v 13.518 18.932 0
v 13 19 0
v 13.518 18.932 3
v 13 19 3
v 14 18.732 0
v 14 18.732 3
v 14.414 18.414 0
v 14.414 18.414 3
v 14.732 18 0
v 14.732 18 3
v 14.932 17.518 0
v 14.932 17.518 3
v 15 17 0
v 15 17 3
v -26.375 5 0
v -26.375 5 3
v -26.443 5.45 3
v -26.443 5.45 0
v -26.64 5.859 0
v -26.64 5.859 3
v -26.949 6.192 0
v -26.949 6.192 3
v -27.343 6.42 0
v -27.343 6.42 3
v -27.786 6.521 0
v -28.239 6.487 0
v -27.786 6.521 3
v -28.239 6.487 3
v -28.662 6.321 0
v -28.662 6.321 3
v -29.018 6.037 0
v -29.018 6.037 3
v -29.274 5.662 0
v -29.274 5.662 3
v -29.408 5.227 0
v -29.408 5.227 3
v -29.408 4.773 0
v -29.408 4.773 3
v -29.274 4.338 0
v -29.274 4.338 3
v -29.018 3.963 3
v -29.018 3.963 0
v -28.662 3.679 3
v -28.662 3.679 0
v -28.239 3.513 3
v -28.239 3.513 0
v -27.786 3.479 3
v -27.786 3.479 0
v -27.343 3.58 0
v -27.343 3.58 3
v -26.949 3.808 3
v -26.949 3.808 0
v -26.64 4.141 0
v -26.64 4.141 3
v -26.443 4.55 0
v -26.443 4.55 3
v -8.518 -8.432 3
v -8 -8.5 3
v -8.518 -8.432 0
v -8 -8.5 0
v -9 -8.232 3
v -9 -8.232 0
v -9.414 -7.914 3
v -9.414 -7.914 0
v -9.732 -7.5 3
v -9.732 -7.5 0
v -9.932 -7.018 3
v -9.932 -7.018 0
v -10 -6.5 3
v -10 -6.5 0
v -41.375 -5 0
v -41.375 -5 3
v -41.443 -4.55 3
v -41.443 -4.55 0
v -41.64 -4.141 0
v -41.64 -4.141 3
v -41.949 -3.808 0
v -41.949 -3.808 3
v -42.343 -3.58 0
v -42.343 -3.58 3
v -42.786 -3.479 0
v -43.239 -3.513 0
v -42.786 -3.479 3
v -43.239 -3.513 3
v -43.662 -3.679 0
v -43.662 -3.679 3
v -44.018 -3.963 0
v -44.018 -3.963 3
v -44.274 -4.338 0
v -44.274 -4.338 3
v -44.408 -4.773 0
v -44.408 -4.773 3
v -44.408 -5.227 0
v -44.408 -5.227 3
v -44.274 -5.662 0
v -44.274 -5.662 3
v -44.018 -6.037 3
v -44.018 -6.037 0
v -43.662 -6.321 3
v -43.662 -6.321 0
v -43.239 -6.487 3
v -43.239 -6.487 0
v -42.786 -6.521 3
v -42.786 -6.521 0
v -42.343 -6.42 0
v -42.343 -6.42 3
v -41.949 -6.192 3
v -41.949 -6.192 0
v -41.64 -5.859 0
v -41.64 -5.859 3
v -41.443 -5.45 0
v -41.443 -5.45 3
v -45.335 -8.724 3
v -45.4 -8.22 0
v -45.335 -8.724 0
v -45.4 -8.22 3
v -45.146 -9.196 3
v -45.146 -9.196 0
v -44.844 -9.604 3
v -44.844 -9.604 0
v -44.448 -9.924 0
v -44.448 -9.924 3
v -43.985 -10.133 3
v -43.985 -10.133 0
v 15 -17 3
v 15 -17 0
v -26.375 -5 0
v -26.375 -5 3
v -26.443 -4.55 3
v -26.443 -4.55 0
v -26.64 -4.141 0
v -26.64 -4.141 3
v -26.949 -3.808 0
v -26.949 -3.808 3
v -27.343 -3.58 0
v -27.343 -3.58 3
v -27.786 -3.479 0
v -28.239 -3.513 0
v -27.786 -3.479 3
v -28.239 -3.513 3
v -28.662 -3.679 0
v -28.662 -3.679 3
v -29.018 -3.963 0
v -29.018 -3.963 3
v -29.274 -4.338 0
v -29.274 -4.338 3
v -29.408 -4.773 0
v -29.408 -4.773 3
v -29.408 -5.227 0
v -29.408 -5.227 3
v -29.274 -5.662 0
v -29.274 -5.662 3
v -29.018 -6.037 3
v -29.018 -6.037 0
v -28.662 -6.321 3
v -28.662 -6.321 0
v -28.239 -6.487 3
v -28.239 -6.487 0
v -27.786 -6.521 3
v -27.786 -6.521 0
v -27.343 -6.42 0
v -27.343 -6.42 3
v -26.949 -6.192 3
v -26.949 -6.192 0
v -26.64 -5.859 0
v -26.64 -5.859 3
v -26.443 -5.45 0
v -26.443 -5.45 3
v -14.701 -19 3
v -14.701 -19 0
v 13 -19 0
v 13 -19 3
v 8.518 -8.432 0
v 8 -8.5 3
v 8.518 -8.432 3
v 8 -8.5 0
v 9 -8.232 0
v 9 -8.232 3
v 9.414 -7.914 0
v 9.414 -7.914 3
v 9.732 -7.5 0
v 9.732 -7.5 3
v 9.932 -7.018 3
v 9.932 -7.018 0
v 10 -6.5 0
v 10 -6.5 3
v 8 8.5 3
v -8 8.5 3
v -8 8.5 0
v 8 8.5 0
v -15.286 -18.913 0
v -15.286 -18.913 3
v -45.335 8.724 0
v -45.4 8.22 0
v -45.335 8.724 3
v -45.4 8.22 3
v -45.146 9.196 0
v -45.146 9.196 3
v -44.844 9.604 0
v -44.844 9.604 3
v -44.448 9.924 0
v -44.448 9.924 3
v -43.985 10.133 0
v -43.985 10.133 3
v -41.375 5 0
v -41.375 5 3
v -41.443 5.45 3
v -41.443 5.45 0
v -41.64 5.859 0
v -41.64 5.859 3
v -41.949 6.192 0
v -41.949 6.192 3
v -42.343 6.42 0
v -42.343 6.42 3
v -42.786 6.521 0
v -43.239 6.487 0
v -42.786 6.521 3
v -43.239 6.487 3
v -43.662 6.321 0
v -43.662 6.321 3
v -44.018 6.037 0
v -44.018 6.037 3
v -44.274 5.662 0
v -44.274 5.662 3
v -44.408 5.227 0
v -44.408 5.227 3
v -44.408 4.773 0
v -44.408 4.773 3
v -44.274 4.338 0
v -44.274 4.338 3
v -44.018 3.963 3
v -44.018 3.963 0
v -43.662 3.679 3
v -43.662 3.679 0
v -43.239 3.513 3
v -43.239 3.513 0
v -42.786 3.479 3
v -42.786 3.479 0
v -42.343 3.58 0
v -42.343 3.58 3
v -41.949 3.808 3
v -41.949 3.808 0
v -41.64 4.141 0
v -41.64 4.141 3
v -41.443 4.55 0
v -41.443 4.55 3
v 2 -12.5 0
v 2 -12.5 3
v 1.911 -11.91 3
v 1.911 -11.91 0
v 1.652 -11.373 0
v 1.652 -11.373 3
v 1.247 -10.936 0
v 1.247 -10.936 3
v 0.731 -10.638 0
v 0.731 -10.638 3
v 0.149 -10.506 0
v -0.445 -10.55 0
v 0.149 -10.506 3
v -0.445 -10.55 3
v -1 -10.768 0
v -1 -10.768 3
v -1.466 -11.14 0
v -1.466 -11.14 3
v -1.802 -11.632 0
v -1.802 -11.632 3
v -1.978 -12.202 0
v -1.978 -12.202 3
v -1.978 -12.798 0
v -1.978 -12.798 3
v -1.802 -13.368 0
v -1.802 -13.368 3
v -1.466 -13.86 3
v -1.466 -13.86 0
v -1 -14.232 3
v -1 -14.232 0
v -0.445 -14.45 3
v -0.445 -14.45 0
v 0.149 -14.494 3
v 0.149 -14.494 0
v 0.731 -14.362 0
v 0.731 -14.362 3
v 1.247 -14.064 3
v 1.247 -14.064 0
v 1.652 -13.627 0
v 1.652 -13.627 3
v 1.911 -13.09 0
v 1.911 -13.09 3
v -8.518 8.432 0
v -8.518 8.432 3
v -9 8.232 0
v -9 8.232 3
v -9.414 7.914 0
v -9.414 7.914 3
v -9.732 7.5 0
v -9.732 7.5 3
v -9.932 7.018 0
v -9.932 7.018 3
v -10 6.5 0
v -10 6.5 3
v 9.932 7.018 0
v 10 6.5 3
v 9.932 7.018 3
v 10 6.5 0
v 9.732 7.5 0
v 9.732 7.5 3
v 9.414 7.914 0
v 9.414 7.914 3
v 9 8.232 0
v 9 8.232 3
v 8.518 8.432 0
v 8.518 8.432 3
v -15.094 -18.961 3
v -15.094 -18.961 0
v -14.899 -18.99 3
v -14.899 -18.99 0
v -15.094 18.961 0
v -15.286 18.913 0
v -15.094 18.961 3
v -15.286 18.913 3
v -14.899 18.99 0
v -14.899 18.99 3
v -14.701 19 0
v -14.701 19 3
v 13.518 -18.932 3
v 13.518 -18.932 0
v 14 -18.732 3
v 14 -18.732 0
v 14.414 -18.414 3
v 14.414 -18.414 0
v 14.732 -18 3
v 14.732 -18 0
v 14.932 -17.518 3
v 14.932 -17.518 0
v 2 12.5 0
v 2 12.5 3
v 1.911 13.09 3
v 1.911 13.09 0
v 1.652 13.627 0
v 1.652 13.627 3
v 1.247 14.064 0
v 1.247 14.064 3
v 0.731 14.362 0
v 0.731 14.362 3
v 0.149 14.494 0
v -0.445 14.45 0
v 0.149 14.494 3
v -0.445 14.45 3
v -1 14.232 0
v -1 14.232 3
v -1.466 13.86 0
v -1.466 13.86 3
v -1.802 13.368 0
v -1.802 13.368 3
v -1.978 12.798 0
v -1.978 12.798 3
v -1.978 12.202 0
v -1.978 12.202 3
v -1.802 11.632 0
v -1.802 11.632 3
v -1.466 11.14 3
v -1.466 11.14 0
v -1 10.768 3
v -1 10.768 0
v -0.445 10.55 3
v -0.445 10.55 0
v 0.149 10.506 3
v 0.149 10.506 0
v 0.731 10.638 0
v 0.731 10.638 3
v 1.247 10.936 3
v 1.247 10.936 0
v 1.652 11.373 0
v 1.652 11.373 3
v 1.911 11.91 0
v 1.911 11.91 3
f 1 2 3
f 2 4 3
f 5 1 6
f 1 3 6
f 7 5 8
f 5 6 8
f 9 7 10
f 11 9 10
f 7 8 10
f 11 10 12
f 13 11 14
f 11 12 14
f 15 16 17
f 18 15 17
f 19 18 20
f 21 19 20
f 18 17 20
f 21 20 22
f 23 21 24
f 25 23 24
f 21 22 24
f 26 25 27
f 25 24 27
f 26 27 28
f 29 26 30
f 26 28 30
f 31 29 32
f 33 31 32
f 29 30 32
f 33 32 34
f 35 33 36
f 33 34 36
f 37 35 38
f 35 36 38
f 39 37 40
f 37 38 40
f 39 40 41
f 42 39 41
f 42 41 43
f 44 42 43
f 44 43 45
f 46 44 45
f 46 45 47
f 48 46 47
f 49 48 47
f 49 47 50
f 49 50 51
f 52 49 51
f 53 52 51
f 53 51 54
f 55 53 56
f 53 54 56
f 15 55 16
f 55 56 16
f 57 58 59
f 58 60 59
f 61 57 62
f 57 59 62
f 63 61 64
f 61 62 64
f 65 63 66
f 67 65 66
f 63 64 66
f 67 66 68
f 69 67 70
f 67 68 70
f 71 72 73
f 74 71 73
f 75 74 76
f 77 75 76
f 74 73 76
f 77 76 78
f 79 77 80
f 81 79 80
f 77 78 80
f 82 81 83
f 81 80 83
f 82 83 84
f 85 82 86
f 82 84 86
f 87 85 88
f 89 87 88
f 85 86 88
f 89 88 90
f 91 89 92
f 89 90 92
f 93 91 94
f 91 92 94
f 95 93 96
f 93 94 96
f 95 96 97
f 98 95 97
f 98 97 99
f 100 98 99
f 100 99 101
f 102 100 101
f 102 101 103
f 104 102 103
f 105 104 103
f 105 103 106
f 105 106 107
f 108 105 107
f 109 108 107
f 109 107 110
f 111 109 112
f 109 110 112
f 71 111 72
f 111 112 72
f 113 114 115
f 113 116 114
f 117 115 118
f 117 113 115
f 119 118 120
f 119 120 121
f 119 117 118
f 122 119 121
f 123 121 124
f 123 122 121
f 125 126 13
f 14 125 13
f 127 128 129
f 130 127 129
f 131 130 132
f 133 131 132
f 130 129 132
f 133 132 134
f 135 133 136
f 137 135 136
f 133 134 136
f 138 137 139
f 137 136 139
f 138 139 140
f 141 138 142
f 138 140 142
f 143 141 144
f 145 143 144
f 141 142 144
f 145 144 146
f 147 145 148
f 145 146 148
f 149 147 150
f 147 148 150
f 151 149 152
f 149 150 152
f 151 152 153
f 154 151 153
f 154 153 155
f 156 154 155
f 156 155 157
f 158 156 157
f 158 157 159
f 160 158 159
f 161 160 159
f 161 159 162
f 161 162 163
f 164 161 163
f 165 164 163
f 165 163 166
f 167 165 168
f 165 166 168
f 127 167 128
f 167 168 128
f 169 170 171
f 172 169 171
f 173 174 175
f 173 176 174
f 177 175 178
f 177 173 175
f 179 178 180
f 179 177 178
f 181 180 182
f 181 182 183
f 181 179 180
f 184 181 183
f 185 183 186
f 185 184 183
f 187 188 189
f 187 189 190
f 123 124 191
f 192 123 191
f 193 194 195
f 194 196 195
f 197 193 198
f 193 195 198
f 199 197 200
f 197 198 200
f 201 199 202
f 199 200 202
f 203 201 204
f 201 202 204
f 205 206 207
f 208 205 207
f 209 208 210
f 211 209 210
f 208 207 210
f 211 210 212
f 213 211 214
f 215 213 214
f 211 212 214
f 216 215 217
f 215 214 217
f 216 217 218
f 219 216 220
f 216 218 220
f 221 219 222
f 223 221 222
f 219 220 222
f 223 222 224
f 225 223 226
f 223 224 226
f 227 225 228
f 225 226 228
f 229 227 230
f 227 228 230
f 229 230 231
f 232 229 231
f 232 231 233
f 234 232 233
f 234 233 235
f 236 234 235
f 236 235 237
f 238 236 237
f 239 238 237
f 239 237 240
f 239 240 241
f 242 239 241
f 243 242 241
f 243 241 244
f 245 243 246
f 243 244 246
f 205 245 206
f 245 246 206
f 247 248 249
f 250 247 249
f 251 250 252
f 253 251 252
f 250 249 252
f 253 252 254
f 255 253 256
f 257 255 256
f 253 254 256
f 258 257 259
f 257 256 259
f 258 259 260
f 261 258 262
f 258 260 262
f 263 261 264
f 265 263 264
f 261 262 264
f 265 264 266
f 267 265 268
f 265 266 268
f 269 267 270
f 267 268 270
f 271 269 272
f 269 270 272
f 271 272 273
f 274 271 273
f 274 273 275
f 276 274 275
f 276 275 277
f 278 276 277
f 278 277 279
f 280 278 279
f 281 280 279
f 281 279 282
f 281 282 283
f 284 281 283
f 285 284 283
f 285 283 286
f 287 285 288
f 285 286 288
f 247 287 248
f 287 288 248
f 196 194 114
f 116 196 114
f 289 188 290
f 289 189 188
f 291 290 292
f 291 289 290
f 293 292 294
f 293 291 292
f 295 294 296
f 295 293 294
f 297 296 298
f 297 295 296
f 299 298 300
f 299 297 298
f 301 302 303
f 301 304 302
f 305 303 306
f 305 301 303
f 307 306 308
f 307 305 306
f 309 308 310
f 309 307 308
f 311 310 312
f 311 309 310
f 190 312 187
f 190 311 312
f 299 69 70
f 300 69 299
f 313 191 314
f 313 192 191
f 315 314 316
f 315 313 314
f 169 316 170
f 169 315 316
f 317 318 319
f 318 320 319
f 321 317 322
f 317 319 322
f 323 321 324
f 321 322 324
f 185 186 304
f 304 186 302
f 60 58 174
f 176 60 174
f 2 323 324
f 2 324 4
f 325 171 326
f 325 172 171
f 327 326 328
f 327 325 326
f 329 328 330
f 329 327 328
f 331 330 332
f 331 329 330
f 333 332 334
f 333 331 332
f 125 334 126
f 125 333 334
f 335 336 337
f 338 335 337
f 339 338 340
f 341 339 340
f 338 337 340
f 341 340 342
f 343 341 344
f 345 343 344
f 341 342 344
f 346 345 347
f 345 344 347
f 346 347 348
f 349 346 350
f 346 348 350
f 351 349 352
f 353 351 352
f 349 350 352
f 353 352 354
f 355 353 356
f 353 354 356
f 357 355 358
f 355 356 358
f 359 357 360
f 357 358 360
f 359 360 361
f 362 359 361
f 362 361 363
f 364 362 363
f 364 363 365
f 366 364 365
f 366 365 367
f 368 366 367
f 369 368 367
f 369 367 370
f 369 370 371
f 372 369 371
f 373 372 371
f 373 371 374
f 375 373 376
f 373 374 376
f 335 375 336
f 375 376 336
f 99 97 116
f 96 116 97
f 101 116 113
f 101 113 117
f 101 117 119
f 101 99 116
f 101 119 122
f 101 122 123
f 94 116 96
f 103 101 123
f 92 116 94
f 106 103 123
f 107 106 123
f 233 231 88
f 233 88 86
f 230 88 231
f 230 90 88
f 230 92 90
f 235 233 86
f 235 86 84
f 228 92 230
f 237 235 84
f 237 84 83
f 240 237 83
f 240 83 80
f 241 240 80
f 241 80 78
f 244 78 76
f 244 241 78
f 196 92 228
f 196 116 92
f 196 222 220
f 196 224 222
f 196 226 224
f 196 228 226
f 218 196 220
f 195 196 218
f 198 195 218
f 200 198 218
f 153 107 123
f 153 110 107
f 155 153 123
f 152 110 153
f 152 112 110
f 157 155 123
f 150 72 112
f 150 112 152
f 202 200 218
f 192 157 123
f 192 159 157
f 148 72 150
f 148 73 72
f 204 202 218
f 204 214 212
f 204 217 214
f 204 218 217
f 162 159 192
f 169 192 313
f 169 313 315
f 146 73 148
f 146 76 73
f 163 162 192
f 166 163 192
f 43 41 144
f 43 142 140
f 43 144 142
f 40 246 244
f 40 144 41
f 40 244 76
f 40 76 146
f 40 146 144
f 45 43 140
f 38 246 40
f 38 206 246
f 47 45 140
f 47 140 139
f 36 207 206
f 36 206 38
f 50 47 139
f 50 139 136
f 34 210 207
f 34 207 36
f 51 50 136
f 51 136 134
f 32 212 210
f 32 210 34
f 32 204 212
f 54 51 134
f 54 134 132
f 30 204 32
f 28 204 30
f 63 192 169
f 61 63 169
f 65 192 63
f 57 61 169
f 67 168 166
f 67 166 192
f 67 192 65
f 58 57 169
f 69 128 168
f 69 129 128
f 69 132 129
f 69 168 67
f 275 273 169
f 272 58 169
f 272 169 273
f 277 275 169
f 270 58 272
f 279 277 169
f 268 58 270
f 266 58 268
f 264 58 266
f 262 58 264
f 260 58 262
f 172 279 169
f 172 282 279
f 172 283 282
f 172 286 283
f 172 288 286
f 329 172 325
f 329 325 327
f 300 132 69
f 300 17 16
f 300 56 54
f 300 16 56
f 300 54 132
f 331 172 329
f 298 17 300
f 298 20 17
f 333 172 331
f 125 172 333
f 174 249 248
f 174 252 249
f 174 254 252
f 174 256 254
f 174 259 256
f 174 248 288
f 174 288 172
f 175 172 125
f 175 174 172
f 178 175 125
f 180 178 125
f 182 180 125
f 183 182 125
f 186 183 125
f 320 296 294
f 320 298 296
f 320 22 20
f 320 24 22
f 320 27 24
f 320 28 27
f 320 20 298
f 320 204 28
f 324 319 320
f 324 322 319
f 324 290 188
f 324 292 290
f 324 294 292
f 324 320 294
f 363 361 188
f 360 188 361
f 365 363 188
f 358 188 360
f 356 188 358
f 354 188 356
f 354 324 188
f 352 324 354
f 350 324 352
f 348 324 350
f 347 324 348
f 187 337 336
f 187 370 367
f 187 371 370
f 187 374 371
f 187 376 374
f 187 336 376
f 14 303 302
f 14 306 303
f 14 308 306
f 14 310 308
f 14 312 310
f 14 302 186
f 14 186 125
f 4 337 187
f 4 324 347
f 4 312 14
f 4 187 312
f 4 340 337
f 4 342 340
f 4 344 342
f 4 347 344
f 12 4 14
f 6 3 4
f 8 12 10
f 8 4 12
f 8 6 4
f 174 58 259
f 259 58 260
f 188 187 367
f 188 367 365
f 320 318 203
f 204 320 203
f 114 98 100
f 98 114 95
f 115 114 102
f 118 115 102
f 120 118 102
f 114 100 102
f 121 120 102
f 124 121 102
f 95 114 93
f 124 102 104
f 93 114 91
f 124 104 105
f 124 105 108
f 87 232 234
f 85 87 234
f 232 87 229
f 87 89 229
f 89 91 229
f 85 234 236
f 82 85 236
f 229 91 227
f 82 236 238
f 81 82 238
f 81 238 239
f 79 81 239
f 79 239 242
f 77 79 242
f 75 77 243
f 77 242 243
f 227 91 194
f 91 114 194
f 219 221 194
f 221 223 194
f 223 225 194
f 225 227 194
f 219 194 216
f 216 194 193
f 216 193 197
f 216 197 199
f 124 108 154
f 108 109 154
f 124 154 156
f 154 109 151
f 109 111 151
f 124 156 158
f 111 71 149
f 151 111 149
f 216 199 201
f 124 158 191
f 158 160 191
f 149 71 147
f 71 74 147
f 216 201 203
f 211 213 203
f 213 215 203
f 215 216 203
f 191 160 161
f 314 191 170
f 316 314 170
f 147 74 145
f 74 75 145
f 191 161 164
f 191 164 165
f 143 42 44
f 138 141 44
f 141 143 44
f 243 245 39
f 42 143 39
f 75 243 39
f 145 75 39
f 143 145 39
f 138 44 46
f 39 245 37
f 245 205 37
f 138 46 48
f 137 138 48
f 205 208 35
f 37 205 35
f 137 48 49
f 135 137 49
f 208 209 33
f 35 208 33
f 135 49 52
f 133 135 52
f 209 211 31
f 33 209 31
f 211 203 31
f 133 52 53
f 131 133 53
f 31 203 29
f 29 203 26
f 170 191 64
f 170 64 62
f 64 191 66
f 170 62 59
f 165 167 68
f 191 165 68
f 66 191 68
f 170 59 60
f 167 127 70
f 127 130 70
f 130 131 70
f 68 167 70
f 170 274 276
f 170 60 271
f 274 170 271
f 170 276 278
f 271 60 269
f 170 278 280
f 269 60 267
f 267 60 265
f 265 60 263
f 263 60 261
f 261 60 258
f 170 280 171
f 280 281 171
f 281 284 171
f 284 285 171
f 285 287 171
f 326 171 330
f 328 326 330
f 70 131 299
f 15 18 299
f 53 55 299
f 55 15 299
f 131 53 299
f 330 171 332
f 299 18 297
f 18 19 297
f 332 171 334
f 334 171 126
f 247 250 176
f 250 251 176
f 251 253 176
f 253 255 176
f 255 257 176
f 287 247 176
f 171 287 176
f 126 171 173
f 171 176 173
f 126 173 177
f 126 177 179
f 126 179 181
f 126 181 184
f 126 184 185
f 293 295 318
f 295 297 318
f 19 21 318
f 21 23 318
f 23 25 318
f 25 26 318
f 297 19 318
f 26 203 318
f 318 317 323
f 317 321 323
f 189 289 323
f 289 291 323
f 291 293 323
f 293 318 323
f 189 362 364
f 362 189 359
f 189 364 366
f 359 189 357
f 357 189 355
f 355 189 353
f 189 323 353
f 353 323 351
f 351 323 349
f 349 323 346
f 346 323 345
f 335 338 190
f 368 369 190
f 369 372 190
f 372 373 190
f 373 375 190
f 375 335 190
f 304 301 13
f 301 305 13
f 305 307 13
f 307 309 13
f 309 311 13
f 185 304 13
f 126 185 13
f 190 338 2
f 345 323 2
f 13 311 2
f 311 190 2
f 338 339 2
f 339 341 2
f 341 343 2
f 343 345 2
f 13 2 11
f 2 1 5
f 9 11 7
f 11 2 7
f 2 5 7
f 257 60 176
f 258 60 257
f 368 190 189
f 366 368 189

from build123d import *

# Parameters (mm, degrees)
SKETCH_1_W          = 30
SKETCH_1_H          = 38
EXTRUDE_1_DEPTH     = 3
SKETCH_2_R          = 2
CUT_EXTRUDE_1_DEPTH = 3
SKETCH_3_R          = 1.525
CUT_EXTRUDE_2_DEPTH = 3
FILLET_1_R          = 2
SKETCH_4_W          = 20
SKETCH_4_H          = 17
CUT_EXTRUDE_3_DEPTH = 3
FILLET_2_R          = 2


with BuildPart() as part:
    # 草图1 → 凸台-拉伸1 (new body)
    with BuildSketch(Plane.XY):
        Polygon((-45.4, 9.7), (-45.4, -9.7), (-15, -19), (-15, 19), align=None)
        Rectangle(SKETCH_1_W, SKETCH_1_H)
    extrude(amount=EXTRUDE_1_DEPTH)

    # 草图2 → 切除-拉伸1 (cut)
    with BuildSketch(Plane.XY.offset(3)):
        with Locations((0, 12.5)):
            Circle(SKETCH_2_R)
        with Locations((0, -12.5)):
            Circle(SKETCH_2_R)
    extrude(amount=-CUT_EXTRUDE_1_DEPTH, mode=Mode.SUBTRACT)

    # 草图3 → 切除-拉伸2 (cut)
    with BuildSketch(Plane.XY.offset(3)):
        with Locations((-42.9, 5)):
            Circle(SKETCH_3_R)
        with Locations((-27.9, 5)):
            Circle(SKETCH_3_R)
        with Locations((-42.9, -5)):
            Circle(SKETCH_3_R)
        with Locations((-27.9, -5)):
            Circle(SKETCH_3_R)
    extrude(amount=-CUT_EXTRUDE_2_DEPTH, mode=Mode.SUBTRACT)

    # 圆角1
    fillet_1_edges = [part.edges().sort_by_distance(p)[0] for p in [
        (-45.4, 9.7, 1.5),
        (-15, 19, 1.5),
        (15, 19, 1.5),
        (15, -19, 1.5),
        (-15, -19, 1.5),
        (-45.4, -9.7, 1.5),
    ]]
    fillet(fillet_1_edges, radius=FILLET_1_R)

    # 草图4 → 切除-拉伸3 (cut)
    with BuildSketch(Plane.XY.offset(3)):
        Rectangle(SKETCH_4_W, SKETCH_4_H)
    extrude(amount=-CUT_EXTRUDE_3_DEPTH, mode=Mode.SUBTRACT)

    # 圆角2
    fillet_2_edges = [part.edges().sort_by_distance(p)[0] for p in [
        (10, 8.5, 1.5),
        (10, -8.5, 1.5),
        (-10, -8.5, 1.5),
        (-10, 8.5, 1.5),
    ]]
    fillet(fillet_2_edges, radius=FILLET_2_R)


solid = part.part
